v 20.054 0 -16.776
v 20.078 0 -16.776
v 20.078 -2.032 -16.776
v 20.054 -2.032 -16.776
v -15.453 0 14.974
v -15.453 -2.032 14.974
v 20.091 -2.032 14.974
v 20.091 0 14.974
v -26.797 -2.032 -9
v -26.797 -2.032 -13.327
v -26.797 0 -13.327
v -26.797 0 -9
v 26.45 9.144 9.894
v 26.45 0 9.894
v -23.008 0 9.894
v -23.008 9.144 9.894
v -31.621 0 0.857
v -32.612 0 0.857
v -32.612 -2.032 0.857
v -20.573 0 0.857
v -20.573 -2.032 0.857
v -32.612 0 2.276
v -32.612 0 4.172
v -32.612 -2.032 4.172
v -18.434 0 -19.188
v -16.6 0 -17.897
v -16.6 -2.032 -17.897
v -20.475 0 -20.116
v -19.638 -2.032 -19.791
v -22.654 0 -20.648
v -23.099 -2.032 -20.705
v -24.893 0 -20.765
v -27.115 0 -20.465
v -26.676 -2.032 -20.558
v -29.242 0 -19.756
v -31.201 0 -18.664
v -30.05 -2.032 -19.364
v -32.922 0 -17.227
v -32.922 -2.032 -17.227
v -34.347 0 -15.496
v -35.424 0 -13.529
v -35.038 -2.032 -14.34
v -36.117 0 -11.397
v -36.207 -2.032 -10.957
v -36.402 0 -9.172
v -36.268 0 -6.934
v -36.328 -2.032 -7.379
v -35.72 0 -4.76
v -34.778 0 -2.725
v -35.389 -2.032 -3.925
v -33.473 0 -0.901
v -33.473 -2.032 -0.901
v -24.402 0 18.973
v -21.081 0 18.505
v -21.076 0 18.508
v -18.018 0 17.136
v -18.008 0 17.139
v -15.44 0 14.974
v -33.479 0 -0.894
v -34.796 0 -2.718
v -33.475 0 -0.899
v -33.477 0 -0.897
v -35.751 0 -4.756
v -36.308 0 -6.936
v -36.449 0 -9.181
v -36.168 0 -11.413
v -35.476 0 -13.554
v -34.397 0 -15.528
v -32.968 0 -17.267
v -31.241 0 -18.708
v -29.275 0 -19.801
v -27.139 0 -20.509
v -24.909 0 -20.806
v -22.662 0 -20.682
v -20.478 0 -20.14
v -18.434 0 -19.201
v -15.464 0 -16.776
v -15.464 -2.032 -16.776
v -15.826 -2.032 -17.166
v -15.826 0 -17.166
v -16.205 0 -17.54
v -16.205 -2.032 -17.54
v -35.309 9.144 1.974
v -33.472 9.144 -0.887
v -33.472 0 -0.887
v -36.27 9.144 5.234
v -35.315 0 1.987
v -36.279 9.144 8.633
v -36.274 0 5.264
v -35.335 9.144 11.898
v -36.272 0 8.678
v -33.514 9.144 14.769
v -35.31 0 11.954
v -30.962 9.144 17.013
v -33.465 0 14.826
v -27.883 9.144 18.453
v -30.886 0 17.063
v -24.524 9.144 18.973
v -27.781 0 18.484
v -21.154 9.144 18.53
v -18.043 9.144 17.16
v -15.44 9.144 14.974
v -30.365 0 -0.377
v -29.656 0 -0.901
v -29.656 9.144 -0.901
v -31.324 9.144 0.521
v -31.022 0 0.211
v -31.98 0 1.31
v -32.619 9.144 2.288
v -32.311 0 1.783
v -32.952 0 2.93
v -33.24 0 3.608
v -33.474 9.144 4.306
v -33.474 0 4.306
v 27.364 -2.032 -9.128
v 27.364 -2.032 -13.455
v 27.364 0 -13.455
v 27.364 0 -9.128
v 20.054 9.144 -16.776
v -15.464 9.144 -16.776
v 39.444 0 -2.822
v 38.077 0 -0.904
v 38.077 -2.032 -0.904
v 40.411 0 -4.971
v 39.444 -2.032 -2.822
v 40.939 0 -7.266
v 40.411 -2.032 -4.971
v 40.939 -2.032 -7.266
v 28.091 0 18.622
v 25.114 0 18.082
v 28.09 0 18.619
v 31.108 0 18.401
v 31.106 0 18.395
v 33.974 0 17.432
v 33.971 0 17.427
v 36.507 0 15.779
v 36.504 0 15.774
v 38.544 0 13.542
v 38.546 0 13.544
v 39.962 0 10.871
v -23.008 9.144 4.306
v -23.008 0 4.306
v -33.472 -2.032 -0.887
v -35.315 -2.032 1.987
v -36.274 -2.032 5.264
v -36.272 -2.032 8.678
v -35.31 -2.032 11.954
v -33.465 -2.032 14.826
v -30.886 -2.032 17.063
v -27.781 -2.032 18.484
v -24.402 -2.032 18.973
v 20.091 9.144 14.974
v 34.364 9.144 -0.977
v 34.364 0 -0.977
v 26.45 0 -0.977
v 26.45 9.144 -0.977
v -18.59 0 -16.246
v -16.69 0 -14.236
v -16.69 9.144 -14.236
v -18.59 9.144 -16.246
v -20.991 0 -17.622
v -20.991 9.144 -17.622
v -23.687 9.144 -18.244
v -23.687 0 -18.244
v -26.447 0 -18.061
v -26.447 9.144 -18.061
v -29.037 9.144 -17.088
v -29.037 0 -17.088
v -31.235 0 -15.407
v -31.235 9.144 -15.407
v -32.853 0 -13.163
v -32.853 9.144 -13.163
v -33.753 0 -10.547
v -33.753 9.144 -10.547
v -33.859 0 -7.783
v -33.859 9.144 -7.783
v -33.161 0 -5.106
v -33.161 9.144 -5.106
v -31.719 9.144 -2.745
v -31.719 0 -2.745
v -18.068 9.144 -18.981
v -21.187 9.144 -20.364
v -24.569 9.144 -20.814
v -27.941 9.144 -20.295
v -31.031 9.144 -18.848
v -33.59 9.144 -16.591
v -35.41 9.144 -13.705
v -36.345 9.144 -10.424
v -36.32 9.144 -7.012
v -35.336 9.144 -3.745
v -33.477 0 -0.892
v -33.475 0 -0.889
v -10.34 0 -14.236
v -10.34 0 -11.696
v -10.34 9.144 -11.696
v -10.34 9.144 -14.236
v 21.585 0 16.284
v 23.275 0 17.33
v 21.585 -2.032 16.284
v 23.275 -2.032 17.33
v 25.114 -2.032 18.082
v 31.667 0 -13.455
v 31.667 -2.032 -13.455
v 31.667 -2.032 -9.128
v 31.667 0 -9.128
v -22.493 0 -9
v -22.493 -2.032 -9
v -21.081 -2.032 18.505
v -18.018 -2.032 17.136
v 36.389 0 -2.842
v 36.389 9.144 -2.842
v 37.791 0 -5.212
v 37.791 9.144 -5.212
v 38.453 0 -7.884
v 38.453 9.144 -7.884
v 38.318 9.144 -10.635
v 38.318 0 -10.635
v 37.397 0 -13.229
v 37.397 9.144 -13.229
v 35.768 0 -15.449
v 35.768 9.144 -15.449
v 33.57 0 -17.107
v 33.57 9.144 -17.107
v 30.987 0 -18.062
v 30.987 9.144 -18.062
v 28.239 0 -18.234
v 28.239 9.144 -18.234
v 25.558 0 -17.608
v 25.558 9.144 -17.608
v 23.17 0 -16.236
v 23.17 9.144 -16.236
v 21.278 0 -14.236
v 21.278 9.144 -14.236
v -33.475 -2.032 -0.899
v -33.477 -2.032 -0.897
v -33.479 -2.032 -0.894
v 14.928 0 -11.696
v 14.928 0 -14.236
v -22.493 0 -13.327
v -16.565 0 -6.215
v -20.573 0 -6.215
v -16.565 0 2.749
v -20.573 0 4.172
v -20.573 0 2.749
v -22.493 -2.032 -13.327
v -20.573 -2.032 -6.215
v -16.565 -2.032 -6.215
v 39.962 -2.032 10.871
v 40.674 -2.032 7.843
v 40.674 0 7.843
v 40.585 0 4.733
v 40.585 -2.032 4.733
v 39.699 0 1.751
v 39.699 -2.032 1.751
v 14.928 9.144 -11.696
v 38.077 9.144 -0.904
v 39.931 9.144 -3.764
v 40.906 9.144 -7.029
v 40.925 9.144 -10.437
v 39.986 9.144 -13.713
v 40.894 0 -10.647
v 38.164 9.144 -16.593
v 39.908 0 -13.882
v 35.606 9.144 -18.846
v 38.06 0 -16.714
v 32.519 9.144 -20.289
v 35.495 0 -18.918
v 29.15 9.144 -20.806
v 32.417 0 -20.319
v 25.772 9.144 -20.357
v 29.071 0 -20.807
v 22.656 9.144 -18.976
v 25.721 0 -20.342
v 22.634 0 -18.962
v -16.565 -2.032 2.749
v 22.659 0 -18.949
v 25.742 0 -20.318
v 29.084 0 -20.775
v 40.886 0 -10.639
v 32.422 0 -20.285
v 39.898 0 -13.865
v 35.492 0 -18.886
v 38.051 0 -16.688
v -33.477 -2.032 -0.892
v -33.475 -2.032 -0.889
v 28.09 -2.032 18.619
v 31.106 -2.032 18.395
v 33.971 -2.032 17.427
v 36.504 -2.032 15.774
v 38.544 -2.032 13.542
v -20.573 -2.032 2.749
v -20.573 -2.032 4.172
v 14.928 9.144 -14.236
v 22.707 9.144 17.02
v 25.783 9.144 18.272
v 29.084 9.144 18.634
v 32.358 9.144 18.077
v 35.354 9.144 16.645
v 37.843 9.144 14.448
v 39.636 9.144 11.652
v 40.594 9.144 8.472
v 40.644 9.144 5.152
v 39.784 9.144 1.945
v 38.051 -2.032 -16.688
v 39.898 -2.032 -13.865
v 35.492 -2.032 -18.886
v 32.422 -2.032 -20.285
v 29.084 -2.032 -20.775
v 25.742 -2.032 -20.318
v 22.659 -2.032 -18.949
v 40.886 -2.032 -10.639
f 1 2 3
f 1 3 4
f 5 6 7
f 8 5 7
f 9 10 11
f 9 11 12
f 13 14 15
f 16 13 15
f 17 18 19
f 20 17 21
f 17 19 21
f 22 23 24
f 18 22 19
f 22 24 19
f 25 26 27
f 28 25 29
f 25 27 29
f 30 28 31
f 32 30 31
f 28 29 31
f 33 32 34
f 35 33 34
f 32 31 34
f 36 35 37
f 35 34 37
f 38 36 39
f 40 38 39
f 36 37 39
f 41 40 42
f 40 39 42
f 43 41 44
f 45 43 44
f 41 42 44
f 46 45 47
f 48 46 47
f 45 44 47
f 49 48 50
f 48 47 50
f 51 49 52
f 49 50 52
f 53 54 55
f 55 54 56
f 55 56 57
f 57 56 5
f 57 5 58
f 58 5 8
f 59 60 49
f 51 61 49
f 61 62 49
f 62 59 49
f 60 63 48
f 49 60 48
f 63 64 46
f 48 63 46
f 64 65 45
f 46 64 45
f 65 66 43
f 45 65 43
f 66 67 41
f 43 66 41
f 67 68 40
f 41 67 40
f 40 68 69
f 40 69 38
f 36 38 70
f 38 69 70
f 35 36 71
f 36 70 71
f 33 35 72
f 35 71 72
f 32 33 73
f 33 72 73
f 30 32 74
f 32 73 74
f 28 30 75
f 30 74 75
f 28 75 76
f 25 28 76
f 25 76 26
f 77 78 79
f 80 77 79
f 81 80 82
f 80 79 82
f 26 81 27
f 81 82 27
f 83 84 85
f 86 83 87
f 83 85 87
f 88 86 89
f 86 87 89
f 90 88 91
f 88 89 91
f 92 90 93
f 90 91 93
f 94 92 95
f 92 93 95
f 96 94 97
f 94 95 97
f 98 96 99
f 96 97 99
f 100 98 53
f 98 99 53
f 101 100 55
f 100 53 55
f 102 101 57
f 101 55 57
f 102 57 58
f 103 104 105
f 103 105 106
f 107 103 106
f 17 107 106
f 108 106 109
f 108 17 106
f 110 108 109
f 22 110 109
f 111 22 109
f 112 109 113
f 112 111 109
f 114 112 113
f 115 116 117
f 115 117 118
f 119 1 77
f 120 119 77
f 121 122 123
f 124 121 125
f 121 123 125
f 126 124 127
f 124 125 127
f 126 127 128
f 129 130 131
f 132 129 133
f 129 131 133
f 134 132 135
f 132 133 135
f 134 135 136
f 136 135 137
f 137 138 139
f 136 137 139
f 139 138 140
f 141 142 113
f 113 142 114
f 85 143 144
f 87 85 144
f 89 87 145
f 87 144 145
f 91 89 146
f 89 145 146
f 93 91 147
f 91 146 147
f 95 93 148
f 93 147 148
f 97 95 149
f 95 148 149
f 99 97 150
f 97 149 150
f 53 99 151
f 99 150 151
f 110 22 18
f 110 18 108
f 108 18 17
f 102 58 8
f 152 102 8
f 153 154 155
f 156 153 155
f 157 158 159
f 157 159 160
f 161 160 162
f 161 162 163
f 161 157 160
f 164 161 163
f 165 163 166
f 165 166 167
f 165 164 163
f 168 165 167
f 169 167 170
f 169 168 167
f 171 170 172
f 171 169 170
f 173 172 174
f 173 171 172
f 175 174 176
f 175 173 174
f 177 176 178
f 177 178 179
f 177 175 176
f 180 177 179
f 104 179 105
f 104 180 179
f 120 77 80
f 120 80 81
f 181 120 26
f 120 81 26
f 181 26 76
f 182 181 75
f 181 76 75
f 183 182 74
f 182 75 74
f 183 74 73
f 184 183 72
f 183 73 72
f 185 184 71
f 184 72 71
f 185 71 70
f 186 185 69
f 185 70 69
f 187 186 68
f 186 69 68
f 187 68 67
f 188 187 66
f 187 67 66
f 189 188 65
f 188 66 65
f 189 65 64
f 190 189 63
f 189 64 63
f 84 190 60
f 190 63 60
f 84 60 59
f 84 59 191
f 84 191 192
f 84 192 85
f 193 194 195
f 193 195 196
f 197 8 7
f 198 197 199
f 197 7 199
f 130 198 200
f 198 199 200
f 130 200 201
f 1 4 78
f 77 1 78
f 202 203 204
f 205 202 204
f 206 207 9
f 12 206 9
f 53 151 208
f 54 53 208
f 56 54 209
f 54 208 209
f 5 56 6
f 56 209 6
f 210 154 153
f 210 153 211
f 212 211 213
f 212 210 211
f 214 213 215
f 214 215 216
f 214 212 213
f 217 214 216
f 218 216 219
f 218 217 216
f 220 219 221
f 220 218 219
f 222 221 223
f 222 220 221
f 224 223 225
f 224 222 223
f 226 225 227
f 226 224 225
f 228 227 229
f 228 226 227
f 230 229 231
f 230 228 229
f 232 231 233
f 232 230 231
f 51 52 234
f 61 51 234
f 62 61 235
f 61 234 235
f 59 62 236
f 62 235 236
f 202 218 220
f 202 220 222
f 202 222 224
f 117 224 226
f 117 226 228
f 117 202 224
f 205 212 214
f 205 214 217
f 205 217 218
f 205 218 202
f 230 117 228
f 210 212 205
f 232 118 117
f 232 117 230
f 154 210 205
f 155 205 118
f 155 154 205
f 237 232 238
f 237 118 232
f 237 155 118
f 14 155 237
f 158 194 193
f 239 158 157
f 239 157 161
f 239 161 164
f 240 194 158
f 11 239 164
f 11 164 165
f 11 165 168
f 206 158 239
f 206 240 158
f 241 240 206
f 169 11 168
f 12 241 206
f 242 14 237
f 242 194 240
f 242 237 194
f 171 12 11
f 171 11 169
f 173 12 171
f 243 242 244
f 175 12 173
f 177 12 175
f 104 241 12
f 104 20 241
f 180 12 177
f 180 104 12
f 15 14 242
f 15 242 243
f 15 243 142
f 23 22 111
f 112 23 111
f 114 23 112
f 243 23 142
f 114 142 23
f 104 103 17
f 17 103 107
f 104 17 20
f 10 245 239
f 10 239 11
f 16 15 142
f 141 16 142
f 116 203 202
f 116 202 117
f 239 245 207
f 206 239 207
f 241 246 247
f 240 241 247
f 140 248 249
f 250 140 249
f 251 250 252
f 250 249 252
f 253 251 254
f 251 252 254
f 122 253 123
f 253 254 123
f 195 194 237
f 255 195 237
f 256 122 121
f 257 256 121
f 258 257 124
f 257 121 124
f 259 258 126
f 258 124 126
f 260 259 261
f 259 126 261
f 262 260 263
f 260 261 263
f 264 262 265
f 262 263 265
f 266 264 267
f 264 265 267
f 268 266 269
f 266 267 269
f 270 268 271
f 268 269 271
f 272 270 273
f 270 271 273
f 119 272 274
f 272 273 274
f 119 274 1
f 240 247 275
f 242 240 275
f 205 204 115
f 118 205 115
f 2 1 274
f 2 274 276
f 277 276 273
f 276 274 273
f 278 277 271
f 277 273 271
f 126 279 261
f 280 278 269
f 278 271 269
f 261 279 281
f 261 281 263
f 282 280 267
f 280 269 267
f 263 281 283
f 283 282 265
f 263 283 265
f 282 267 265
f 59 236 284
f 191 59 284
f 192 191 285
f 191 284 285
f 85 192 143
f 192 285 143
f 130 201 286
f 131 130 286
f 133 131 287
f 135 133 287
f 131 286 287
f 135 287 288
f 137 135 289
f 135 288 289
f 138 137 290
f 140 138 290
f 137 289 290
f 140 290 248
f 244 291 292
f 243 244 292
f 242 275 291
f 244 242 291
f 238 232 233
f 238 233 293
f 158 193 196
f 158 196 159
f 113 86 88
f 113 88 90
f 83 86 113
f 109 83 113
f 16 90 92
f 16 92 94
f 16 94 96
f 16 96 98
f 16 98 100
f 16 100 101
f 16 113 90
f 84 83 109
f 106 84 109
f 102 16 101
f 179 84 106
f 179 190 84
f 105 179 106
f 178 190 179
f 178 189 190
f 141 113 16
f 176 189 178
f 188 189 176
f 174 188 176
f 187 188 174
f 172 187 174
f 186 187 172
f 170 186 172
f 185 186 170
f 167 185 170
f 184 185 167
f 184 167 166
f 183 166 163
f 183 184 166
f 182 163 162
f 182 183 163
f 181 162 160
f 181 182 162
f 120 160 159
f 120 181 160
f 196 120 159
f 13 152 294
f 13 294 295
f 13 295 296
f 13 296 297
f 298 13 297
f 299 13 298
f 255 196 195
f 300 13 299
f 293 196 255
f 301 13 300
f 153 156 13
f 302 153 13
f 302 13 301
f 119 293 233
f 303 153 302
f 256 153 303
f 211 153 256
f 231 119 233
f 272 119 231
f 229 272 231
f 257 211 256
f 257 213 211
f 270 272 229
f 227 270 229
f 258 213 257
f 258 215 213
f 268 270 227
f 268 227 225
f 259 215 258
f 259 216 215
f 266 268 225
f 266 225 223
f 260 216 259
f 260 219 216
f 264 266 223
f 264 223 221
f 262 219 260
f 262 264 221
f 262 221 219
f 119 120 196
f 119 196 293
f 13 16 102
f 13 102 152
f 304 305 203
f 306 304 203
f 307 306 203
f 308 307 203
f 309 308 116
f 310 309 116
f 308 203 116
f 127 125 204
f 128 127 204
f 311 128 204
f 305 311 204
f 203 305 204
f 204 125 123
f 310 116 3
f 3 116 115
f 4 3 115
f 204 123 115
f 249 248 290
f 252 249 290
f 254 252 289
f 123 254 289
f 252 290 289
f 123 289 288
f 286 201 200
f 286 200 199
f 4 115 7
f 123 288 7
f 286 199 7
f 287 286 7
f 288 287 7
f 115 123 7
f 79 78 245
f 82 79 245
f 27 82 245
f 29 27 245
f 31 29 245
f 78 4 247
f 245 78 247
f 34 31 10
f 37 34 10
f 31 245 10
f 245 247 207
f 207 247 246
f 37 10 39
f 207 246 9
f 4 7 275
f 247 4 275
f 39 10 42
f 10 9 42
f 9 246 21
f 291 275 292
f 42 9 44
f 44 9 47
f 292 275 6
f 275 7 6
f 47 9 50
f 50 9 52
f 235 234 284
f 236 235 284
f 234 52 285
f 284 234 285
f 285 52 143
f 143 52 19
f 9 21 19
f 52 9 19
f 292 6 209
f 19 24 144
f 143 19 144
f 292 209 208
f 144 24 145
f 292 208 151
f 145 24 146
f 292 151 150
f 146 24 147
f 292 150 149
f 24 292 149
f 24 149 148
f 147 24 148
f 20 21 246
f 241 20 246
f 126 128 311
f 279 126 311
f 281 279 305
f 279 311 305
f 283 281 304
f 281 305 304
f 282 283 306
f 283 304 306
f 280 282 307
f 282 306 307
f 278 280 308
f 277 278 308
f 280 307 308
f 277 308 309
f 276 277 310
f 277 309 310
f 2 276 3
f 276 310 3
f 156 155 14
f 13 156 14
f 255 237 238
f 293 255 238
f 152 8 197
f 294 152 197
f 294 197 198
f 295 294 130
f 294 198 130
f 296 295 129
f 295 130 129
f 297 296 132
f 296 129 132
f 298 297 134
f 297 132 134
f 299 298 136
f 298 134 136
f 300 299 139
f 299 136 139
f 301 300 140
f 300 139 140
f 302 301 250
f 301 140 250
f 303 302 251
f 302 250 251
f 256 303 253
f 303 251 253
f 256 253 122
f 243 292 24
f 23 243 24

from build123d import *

# Parameters (mm, degrees)
SKETCH1_W               = 25.267998504
SKETCH1_H               = 2.54
BOSS_EXTRUDE7_DEPTH     = 9.144
BOSS_EXTRUDE9_START     = -2.032
BOSS_EXTRUDE9_OUTLINE_W = 4.303574795
BOSS_EXTRUDE9_OUTLINE_H = 4.327328355
BOSS_EXTRUDE9_DEPTH     = 2.032


# Read off the part's stored shape, not the designer's step: Boss-Extrude9
with BuildPart() as part:
    # Sketch1 → Boss-Extrude7 (new body)
    # profile 1 of 5: a face of its own
    with BuildSketch(Plane(origin=(0, 0, 0), x_dir=(1, 0, 0), z_dir=(0, 1, 0))):
        with BuildLine():
            ThreePointArc((20.091392362, -14.973938339), (36.674866164, -15.633001334), (38.077226225, 0.904209847))
            ThreePointArc((38.077226225, 0.904209847), (36.965236291, 17.810596862), (20.053933255, 16.7760568))
            Line((20.053933255, 16.7760568), (-15.464178996, 16.7760568))
            ThreePointArc((-15.464178996, 16.7760568), (-32.391267437, 17.810916917), (-33.472263124, 0.886712153))
            ThreePointArc((-33.472263124, 0.886712153), (-32.31789128, -15.981799893), (-15.439991882, -14.973938339))
            Line((-15.439991882, -14.973938339), (20.091392362, -14.973938339))
        make_face()
        with BuildLine():
            ThreePointArc((-29.65629843, 0.90105923), (-31.167264268, -13.573979358), (-16.658299233, -12.433938339))
            Line((-16.658299233, -12.433938339), (21.246557929, -12.433938339))
            ThreePointArc((21.246557929, -12.433938339), (35.496314389, -13.251428184), (34.363784281, 0.976755972))
            ThreePointArc((34.363784281, 0.976755972), (35.768086185, 15.449459714), (21.2781286, 14.2360568))
            Line((21.2781286, 14.2360568), (-16.689869904, 14.2360568))
            ThreePointArc((-16.689869904, 14.2360568), (-31.234591455, 15.407251461), (-29.65629843, 0.90105923))
        make_face(mode=Mode.SUBTRACT)
    # profile 2 of 5: a face of its own
    with BuildSketch(Plane(origin=(0, 0, 0), x_dir=(1, 0, 0), z_dir=(0, 1, 0))):
        with BuildLine():
            ThreePointArc((-33.474089865, -4.305938339), (-28.507587271, -15.489738966), (-16.658299233, -12.433938339))
            Line((-16.658299233, -12.433938339), (-10.339869904, -12.433938339))
            Line((-10.339869904, -12.433938339), (-10.339869904, -9.893938339))
            Line((-10.339869904, -9.893938339), (-16.658299233, -9.893938339))
            Line((-16.658299233, -9.893938339), (-23.008299233, -9.893938339))
            Line((-23.008299233, -9.893938339), (-23.008299233, -4.305938339))
            Line((-23.008299233, -4.305938339), (-33.474089865, -4.305938339))
        make_face()
    # profile 3 of 5: a face of its own
    with BuildSketch(Plane(origin=(0, 0, 0), x_dir=(1, 0, 0), z_dir=(0, 1, 0))):
        with Locations((2.294129348, -11.163938339)):
            Rectangle(SKETCH1_W, SKETCH1_H)
    # profile 4 of 5: a face of its own
    with BuildSketch(Plane(origin=(0, 0, 0), x_dir=(1, 0, 0), z_dir=(0, 1, 0))):
        with BuildLine():
            Line((14.9281286, -9.893938339), (14.9281286, -12.433938339))
            Line((14.9281286, -12.433938339), (21.246557929, -12.433938339))
            ThreePointArc((21.246557929, -12.433938339), (35.496314389, -13.251428184), (34.363784281, 0.976755972))
            Line((34.363784281, 0.976755972), (26.449874225, 0.976755972))
            Line((26.449874225, 0.976755972), (26.449874225, -9.893938339))
            Line((26.449874225, -9.893938339), (21.246557929, -9.893938339))
            Line((21.246557929, -9.893938339), (14.9281286, -9.893938339))
        make_face()
    # profile 5 of 5: a face of its own
    with BuildSketch(Plane(origin=(0, 0, 0), x_dir=(1, 0, 0), z_dir=(0, 1, 0))):
        with Locations((2.294129348, 12.9660568)):
            Rectangle(SKETCH1_W, SKETCH1_H)
    extrude(amount=BOSS_EXTRUDE7_DEPTH)

    # Boss-Extrude9 outline → Boss-Extrude9 (add)
    with BuildSketch(Plane(origin=(0, 0, 2.54), x_dir=(-1, 0, 0), z_dir=(0, 1, 0)).offset(BOSS_EXTRUDE9_START)):
        with BuildLine():
            ThreePointArc((-39.962274592, 8.331071624), (-40.584803359, 2.192889064), (-38.077226225, -3.444209847))
            ThreePointArc((-38.077226225, -3.444209847), (-39.980253201, -6.412725487), (-40.938977335, -9.806019581))
            ThreePointArc((-40.938977335, -9.806019581), (-34.00622148, -22.23363184), (-20.077959401, -19.316070247))
            Line((-20.077959401, -19.316070247), (-20.053939231, -19.316070247))
            Line((-20.053939231, -19.316070247), (15.464178996, -19.3160568))
            ThreePointArc((15.464178996, -19.3160568), (16.013662974, -19.895397798), (16.600434504, -20.436939861))
            ThreePointArc((16.600434504, -20.436939861), (32.922411354, -19.767481007), (33.473277412, -3.441071419))
            ThreePointArc((33.473277412, -3.441071419), (33.476154659, -3.437751763), (33.47903069, -3.434431054))
            ThreePointArc((33.47903069, -3.434431054), (33.475647732, -3.43057088), (33.472263124, -3.426712153))
            ThreePointArc((33.472263124, -3.426712153), (35.310098705, 9.413648761), (24.402438556, 16.433296764))
            ThreePointArc((24.402438556, 16.433296764), (19.501273126, 15.38830994), (15.453425616, 12.433931737))
            Line((15.453425616, 12.433931737), (-20.091392362, 12.433938339))
            ThreePointArc((-20.091392362, 12.433938339), (-22.408655082, 14.301808135), (-25.114144013, 15.542361937))
            ThreePointArc((-25.114144013, 15.542361937), (-33.970966426, 14.886780351), (-39.962274592, 8.331071624))
        make_face()
        with Locations((-29.515589711, -13.831402182)):
            Rectangle(BOSS_EXTRUDE9_OUTLINE_W, BOSS_EXTRUDE9_OUTLINE_H, mode=Mode.SUBTRACT)
        with Locations((24.644768928, -13.703519078)):
            Rectangle(BOSS_EXTRUDE9_OUTLINE_W, BOSS_EXTRUDE9_OUTLINE_H, mode=Mode.SUBTRACT)
        Polygon((32.612403312, 1.632473231), (32.612403312, -1.682770742), (20.573249237, -1.682770742), (20.573249237, -8.754579205), (16.565180299, -8.754579205), (16.565180299, 0.209107335), (20.573249237, 0.209107335), (20.573249237, 1.632473231), align=None, mode=Mode.SUBTRACT)
    extrude(amount=BOSS_EXTRUDE9_DEPTH)


solid = part.part
